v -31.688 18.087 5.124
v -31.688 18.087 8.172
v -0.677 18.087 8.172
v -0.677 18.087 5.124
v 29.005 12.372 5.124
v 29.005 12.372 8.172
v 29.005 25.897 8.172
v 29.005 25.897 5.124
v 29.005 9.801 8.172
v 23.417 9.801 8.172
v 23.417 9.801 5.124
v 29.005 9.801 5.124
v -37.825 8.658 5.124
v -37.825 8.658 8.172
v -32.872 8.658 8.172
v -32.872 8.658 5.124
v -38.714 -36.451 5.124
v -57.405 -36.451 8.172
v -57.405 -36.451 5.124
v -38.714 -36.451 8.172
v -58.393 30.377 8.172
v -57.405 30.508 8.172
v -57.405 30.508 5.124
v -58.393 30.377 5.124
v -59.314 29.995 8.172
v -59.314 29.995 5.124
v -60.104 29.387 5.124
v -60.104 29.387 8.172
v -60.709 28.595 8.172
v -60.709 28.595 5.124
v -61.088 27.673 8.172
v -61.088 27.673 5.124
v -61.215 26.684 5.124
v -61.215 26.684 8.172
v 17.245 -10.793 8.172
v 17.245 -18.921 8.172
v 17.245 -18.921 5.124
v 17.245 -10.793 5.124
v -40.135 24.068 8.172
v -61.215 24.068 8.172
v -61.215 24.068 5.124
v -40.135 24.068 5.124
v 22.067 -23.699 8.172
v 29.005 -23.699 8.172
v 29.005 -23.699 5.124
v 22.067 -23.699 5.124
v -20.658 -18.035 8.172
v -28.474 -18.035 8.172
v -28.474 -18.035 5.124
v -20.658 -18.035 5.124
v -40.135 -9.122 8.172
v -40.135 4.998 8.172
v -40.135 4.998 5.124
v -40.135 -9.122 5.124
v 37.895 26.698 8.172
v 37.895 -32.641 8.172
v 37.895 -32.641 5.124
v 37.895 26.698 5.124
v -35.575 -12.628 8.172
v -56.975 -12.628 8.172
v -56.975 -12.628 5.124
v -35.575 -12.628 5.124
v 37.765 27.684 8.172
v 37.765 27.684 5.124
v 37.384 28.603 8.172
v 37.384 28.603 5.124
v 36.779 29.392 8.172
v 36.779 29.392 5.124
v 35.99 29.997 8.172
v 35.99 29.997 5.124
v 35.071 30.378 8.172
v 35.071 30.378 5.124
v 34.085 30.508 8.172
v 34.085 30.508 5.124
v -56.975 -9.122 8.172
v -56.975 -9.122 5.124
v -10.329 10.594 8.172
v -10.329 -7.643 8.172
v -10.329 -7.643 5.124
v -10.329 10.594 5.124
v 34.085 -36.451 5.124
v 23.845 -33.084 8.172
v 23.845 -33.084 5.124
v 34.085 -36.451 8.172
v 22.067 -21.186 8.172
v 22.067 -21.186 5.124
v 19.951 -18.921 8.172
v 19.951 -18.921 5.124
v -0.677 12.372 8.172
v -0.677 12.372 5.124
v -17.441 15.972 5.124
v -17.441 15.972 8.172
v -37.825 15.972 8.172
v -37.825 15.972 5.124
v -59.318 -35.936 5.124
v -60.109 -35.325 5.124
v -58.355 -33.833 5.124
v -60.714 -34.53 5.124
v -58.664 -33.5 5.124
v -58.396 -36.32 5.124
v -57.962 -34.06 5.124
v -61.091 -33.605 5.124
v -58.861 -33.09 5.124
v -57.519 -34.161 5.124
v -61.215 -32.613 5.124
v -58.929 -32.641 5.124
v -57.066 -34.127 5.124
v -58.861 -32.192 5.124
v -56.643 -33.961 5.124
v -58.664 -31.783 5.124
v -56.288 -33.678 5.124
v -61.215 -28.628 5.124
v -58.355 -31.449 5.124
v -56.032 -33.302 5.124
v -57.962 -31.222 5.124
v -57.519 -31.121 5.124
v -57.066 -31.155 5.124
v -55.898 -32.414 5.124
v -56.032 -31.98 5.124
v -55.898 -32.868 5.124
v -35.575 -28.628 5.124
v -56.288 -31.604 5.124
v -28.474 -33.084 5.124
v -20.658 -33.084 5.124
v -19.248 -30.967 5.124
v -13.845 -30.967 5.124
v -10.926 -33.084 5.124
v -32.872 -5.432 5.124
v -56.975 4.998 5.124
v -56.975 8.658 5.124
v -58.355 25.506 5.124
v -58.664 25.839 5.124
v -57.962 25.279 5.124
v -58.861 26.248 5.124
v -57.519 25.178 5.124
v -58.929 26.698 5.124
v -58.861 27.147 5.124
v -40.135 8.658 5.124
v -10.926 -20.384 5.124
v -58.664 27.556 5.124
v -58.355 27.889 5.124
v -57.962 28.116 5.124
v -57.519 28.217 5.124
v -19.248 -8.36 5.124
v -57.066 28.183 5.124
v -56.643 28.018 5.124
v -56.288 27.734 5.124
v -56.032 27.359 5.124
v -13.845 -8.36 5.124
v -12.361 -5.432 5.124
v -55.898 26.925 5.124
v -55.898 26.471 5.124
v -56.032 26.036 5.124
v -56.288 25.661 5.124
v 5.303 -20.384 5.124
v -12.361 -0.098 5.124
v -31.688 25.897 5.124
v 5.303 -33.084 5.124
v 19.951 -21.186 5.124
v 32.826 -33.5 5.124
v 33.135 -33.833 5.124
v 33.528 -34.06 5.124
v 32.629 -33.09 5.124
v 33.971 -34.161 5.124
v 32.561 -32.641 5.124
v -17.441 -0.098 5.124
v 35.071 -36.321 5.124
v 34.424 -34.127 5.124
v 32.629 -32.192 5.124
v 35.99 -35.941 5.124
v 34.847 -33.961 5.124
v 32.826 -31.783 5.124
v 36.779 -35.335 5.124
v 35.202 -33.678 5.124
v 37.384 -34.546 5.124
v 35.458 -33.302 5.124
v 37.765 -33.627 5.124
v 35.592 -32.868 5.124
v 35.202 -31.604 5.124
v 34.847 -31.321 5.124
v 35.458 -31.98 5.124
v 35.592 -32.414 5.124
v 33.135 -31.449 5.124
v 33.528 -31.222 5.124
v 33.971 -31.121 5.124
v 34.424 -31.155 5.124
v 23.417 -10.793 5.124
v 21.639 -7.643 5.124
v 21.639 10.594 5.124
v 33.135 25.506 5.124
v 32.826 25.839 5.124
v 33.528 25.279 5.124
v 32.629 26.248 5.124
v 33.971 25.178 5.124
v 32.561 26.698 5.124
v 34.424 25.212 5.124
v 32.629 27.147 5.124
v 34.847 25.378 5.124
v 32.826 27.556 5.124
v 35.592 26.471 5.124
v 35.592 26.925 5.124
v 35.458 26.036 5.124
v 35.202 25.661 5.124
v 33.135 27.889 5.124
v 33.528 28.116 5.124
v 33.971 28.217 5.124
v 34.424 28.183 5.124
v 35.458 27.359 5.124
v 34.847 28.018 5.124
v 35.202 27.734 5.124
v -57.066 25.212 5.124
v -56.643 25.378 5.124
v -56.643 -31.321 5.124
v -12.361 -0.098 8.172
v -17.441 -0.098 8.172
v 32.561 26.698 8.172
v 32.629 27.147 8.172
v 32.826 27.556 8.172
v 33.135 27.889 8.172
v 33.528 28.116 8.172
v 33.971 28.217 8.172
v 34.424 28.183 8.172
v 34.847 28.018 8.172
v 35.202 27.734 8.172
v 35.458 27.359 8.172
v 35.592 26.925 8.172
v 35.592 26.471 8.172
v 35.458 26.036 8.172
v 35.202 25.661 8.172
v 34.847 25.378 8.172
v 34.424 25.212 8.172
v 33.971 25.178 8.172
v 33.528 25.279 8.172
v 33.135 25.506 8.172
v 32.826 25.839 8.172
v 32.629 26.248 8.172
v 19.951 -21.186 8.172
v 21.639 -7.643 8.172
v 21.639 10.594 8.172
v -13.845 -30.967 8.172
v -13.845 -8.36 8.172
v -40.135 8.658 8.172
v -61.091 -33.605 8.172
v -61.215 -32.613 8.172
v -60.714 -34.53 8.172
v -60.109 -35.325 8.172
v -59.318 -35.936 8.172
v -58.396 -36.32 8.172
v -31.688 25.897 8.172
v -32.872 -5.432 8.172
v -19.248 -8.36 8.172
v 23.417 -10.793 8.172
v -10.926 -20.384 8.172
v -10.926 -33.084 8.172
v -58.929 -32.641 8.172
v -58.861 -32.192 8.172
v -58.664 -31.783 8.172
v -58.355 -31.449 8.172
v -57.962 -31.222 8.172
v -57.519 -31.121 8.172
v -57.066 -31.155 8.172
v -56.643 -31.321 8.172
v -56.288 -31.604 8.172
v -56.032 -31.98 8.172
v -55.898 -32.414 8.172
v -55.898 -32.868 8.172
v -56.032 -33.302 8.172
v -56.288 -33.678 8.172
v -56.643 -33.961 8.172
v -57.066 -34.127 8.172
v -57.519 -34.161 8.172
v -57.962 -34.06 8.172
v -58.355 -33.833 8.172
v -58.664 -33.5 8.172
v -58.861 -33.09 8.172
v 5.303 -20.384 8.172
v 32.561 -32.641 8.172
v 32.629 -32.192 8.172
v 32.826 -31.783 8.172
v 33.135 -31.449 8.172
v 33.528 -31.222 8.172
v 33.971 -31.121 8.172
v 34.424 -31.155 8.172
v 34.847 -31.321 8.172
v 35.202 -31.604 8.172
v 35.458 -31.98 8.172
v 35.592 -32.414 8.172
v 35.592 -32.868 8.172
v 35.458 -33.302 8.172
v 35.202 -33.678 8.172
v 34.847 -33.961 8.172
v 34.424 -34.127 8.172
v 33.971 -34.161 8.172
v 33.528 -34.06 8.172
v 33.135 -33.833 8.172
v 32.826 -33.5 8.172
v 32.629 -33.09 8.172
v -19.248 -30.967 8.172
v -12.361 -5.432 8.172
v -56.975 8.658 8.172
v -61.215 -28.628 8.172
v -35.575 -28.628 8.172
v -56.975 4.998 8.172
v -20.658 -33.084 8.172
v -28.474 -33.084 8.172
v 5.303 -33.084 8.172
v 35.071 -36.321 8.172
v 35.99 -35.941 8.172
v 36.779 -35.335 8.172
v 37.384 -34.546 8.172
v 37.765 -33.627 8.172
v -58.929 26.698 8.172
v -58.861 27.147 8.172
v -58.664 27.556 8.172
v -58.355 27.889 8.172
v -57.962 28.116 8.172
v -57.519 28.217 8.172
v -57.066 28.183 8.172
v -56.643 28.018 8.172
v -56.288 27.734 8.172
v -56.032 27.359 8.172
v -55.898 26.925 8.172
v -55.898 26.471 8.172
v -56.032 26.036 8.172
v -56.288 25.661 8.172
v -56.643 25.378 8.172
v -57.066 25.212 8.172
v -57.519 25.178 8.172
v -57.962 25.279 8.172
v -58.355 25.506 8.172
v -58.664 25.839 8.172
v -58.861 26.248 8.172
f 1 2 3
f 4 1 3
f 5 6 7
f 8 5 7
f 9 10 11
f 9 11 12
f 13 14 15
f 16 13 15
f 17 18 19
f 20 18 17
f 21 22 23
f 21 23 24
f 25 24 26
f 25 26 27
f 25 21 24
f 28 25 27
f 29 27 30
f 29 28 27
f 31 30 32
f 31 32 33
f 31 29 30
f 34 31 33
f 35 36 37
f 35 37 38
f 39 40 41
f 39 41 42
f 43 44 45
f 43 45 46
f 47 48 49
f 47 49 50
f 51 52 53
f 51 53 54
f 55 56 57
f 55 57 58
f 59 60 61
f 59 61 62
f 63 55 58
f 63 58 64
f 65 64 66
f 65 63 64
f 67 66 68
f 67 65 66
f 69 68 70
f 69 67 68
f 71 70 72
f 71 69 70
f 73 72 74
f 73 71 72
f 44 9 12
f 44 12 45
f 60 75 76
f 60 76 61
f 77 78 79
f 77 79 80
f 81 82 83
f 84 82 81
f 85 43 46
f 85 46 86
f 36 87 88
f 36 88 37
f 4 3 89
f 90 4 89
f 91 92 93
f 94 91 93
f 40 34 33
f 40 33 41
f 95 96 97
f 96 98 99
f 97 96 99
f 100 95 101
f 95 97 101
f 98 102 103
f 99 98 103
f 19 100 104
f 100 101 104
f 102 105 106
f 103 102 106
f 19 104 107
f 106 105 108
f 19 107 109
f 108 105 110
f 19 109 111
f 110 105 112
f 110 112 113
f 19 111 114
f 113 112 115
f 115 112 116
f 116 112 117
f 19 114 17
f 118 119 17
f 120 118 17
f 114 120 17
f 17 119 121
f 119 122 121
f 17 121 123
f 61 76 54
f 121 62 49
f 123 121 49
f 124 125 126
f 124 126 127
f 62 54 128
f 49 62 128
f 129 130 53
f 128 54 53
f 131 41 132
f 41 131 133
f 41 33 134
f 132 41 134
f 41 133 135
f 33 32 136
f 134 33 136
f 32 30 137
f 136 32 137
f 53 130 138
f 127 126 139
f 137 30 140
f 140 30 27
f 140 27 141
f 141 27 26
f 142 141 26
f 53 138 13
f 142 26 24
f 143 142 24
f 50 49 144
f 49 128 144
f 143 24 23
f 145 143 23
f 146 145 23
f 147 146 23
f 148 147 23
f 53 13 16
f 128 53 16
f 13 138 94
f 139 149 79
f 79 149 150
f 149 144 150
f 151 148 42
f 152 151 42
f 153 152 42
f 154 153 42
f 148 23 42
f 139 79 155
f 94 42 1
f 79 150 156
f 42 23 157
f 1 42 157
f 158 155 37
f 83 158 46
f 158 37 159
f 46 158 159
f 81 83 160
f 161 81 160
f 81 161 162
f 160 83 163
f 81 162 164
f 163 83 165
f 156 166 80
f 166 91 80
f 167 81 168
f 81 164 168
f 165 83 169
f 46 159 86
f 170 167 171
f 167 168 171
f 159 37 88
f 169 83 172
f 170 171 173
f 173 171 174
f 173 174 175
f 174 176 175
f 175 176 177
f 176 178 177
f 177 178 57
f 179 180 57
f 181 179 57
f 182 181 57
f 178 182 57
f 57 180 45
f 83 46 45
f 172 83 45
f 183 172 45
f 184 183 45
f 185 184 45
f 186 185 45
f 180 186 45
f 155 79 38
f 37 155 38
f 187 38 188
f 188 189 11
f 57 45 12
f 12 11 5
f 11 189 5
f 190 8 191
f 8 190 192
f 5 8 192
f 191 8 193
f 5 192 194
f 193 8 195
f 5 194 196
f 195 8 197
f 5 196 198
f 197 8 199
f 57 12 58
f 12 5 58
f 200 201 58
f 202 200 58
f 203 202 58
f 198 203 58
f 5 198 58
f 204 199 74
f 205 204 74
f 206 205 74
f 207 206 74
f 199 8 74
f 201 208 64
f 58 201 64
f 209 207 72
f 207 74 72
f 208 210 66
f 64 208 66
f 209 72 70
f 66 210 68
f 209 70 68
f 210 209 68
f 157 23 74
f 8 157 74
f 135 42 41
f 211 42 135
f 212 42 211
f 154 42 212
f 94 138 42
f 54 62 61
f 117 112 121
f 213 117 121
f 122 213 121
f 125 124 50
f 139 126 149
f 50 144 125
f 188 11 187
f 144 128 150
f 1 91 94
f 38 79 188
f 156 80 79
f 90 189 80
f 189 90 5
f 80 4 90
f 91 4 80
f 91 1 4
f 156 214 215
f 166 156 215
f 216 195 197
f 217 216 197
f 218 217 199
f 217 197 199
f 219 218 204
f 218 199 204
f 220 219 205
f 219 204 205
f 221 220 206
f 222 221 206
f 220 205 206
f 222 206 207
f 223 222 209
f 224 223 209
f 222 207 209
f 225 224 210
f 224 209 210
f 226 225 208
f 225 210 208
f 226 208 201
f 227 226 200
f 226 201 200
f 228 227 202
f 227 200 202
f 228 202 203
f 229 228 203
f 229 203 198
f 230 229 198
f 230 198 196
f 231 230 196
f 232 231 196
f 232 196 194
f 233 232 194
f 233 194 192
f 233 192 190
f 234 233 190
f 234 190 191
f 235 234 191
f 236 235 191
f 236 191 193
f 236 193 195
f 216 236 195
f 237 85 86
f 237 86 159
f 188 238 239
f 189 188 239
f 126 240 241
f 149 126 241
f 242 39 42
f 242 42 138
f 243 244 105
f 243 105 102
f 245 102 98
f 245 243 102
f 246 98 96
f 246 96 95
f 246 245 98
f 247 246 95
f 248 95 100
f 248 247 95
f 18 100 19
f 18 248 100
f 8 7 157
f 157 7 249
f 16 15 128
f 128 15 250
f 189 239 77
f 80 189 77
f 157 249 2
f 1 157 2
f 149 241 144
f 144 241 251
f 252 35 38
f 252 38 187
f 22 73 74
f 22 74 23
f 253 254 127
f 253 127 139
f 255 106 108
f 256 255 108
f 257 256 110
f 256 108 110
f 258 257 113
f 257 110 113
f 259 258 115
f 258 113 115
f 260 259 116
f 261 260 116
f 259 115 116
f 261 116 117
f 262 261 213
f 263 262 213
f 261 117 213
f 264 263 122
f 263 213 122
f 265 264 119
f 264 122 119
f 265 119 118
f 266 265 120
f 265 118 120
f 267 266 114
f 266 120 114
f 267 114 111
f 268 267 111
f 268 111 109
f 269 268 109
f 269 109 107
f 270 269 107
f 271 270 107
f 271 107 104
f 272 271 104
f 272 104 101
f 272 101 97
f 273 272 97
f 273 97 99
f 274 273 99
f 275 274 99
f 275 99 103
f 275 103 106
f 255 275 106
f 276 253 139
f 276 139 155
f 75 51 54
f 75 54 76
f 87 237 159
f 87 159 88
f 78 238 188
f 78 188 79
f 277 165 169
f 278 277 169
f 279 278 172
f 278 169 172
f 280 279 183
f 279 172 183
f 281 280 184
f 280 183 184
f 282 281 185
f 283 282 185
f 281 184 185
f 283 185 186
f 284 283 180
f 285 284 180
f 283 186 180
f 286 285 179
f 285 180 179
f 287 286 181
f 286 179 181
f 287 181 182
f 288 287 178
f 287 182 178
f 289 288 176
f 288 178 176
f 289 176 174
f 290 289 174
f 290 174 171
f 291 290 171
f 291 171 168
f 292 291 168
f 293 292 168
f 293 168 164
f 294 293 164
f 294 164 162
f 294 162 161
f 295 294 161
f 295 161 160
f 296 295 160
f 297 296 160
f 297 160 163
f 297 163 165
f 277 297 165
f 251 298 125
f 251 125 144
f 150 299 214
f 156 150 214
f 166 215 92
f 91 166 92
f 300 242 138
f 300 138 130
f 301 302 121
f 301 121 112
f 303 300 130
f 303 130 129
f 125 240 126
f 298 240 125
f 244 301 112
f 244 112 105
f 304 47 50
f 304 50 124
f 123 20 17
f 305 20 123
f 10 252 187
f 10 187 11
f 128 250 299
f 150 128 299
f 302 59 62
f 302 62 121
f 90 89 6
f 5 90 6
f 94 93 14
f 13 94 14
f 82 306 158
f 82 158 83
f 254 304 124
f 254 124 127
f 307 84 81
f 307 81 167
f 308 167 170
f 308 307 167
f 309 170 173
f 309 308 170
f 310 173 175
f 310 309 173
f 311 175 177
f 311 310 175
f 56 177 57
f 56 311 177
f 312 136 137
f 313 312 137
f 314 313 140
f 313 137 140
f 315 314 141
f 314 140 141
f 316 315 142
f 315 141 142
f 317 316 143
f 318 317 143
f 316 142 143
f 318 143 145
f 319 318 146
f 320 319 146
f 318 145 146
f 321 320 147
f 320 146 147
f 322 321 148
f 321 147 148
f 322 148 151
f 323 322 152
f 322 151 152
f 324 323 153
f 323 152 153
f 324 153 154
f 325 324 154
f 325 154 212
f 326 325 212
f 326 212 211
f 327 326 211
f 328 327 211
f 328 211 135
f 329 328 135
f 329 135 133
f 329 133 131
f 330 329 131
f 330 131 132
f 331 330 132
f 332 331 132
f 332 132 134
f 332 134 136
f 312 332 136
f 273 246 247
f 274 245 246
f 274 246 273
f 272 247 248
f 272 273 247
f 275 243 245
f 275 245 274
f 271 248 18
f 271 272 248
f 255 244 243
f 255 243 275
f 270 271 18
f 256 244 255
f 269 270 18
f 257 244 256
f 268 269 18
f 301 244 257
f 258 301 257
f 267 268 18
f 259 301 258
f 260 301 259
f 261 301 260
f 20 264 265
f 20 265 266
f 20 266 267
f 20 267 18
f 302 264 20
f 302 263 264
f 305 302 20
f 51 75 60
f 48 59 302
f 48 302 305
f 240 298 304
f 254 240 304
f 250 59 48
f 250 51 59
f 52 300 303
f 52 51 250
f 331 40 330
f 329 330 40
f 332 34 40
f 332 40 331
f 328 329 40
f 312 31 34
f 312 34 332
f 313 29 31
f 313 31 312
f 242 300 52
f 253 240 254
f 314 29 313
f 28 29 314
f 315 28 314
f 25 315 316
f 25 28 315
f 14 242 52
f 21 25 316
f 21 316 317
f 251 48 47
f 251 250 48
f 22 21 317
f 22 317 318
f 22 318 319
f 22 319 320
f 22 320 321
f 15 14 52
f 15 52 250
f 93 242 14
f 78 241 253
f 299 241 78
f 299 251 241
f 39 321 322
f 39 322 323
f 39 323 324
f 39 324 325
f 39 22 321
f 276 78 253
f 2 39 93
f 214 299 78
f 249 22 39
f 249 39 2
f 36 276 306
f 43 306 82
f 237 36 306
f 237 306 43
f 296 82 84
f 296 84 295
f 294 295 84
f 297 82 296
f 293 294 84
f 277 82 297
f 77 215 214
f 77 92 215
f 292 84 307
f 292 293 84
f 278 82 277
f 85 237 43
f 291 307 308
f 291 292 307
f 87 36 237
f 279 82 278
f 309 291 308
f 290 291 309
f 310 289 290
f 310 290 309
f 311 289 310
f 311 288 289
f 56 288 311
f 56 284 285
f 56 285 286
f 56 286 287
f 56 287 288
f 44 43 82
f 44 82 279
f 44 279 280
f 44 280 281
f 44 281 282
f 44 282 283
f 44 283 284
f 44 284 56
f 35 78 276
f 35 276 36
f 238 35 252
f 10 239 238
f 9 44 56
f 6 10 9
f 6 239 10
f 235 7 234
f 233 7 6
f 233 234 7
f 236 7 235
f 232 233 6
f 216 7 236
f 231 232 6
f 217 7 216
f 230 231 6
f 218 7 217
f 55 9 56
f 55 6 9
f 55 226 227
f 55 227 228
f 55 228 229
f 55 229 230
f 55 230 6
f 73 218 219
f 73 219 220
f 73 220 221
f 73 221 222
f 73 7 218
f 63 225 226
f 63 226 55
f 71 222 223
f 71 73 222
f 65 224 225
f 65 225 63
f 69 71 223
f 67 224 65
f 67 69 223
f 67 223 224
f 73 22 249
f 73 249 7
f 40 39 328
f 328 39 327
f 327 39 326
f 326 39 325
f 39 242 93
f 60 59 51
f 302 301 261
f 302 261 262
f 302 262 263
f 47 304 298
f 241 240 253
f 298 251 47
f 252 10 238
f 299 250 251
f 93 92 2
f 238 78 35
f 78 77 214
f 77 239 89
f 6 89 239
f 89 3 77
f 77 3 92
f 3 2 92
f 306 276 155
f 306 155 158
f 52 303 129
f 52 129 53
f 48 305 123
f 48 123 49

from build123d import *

# Parameters (mm, degrees)
SKETCH2_W           = 5.4034
SKETCH2_H           = 22.6066
SKETCH2_W_2         = 31.9679
SKETCH2_H_2         = 18.2371
BOSS_EXTRUDE1_DEPTH = 3.048
SKETCH3_R           = 1.338245378
CUT_EXTRUDE1_DEPTH  = 4.048
SKETCH4_R           = 1.524
CUT_EXTRUDE2_DEPTH  = 4.048


with BuildPart() as part:
    # Sketch2 → Boss-Extrude1 (new body)
    with BuildSketch(Plane(origin=(0, 0, 8.171752382), x_dir=(-1, 0, 0), z_dir=(0, 0, -1))):
        with BuildLine():
            Line((-23.844892625, -33.084405696), (-34.084892625, -36.451005696))
            ThreePointArc((-34.084892625, -36.451005696), (-36.778969461, -35.335082532), (-37.894892625, -32.641005696))
            Line((-37.894892625, -32.641005696), (-37.894892625, 26.697694304))
            ThreePointArc((-37.894892625, 26.697694304), (-36.778969461, 29.391771141), (-34.084892625, 30.507694304))
            Line((-34.084892625, 30.507694304), (57.404932375, 30.507694304))
            ThreePointArc((57.404932375, 30.507694304), (60.103884597, 29.386886916), (61.214907375, 26.683892153))
            Line((61.214907375, 26.683892153), (61.214907375, 24.068294304))
            Line((61.214907375, 24.068294304), (40.134807375, 24.068294304))
            Line((40.134807375, 24.068294304), (40.134807375, 8.658194304))
            Line((40.134807375, 8.658194304), (56.975007375, 8.658194304))
            Line((56.975007375, 8.658194304), (56.975007375, 4.997894304))
            Line((56.975007375, 4.997894304), (40.134807375, 4.997894304))
            Line((40.134807375, 4.997894304), (40.134807375, -9.121805696))
            Line((40.134807375, -9.121805696), (56.975007375, -9.121805696))
            Line((56.975007375, -9.121805696), (56.975007375, -12.628005696))
            Line((56.975007375, -12.628005696), (35.575007375, -12.628005696))
            Line((35.575007375, -12.628005696), (35.575007375, -28.627805696))
            Line((35.575007375, -28.627805696), (61.214907375, -28.627805696))
            Line((61.214907375, -28.627805696), (61.214907375, -32.613401529))
            ThreePointArc((61.214907375, -32.613401529), (60.108826144, -35.325305244), (57.405007375, -36.451005696))
            Line((57.405007375, -36.451005696), (38.714307375, -36.451005696))
            Line((38.714307375, -36.451005696), (28.474307375, -33.084405696))
            Line((28.474307375, -33.084405696), (28.474307375, -18.034905696))
            Line((28.474307375, -18.034905696), (20.658107375, -18.034905696))
            Line((20.658107375, -18.034905696), (20.658107375, -33.084405696))
            Line((20.658107375, -33.084405696), (10.926407375, -33.084405696))
            Line((10.926407375, -33.084405696), (10.926407375, -20.384405696))
            Line((10.926407375, -20.384405696), (-5.302892625, -20.384405696))
            Line((-5.302892625, -20.384405696), (-5.302892625, -33.084405696))
            Line((-5.302892625, -33.084405696), (-23.844892625, -33.084405696))
        make_face()
        with Locations((16.546707375, -19.663505696)):
            Rectangle(SKETCH2_W, SKETCH2_H, mode=Mode.SUBTRACT)
        Polygon((-29.004892625, -23.698905696), (-22.066892625, -23.698905696), (-22.066892625, -21.185805696), (-19.950892625, -21.185805696), (-19.950892625, -18.920605696), (-17.244692625, -18.920605696), (-17.244692625, -10.792605696), (-23.416892625, -10.792605696), (-23.416892625, 9.801194304), (-29.004892625, 9.801194304), align=None, mode=Mode.SUBTRACT)
        with Locations((-5.654942625, 1.475544304)):
            Rectangle(SKETCH2_W_2, SKETCH2_H_2, mode=Mode.SUBTRACT)
        Polygon((12.361007375, -0.097605696), (17.441007375, -0.097605696), (17.441007375, 15.972394304), (37.825007375, 15.972394304), (37.825007375, 8.658194304), (32.872007375, 8.658194304), (32.872007375, -5.431505696), (12.361007375, -5.431505696), align=None, mode=Mode.SUBTRACT)
        Polygon((0.677107375, 12.372094304), (-29.004794688, 12.372094304), (-29.004892625, 25.896994304), (31.688307375, 25.896994304), (31.688307375, 18.086994304), (0.677107375, 18.086994304), align=None, mode=Mode.SUBTRACT)
    extrude(amount=BOSS_EXTRUDE1_DEPTH)

    # Sketch3 → Cut-Extrude1 (cut, through all)
    with BuildSketch(Plane(origin=(0, 0, 5.123752382), x_dir=(-1, 0, 0), z_dir=(0, 0, -1))):
        with Locations((57.405007375, -32.641005696)):
            Circle(SKETCH3_R)
        with Locations((-34.084892625, -32.641005696)):
            Circle(SKETCH3_R)
        with Locations((-34.084892625, 26.697694304)):
            Circle(SKETCH3_R)
        with Locations((57.404932375, 26.697694304)):
            Circle(SKETCH3_R)
    extrude(amount=-CUT_EXTRUDE1_DEPTH, mode=Mode.SUBTRACT)

    # Sketch4 → Cut-Extrude2 (cut, through all)
    with BuildSketch(Plane(origin=(0, 0, 5.123752382), x_dir=(-1, 0, 0), z_dir=(0, 0, -1))):
        with Locations((-34.084892625, 26.697694304)):
            Circle(SKETCH4_R)
        with Locations((-34.084892625, -32.641005696)):
            Circle(SKETCH4_R)
        with Locations((57.405007375, -32.641005696)):
            Circle(SKETCH4_R)
        with Locations((57.404932375, 26.697694304)):
            Circle(SKETCH4_R)
    extrude(amount=-CUT_EXTRUDE2_DEPTH, mode=Mode.SUBTRACT)


solid = part.part
